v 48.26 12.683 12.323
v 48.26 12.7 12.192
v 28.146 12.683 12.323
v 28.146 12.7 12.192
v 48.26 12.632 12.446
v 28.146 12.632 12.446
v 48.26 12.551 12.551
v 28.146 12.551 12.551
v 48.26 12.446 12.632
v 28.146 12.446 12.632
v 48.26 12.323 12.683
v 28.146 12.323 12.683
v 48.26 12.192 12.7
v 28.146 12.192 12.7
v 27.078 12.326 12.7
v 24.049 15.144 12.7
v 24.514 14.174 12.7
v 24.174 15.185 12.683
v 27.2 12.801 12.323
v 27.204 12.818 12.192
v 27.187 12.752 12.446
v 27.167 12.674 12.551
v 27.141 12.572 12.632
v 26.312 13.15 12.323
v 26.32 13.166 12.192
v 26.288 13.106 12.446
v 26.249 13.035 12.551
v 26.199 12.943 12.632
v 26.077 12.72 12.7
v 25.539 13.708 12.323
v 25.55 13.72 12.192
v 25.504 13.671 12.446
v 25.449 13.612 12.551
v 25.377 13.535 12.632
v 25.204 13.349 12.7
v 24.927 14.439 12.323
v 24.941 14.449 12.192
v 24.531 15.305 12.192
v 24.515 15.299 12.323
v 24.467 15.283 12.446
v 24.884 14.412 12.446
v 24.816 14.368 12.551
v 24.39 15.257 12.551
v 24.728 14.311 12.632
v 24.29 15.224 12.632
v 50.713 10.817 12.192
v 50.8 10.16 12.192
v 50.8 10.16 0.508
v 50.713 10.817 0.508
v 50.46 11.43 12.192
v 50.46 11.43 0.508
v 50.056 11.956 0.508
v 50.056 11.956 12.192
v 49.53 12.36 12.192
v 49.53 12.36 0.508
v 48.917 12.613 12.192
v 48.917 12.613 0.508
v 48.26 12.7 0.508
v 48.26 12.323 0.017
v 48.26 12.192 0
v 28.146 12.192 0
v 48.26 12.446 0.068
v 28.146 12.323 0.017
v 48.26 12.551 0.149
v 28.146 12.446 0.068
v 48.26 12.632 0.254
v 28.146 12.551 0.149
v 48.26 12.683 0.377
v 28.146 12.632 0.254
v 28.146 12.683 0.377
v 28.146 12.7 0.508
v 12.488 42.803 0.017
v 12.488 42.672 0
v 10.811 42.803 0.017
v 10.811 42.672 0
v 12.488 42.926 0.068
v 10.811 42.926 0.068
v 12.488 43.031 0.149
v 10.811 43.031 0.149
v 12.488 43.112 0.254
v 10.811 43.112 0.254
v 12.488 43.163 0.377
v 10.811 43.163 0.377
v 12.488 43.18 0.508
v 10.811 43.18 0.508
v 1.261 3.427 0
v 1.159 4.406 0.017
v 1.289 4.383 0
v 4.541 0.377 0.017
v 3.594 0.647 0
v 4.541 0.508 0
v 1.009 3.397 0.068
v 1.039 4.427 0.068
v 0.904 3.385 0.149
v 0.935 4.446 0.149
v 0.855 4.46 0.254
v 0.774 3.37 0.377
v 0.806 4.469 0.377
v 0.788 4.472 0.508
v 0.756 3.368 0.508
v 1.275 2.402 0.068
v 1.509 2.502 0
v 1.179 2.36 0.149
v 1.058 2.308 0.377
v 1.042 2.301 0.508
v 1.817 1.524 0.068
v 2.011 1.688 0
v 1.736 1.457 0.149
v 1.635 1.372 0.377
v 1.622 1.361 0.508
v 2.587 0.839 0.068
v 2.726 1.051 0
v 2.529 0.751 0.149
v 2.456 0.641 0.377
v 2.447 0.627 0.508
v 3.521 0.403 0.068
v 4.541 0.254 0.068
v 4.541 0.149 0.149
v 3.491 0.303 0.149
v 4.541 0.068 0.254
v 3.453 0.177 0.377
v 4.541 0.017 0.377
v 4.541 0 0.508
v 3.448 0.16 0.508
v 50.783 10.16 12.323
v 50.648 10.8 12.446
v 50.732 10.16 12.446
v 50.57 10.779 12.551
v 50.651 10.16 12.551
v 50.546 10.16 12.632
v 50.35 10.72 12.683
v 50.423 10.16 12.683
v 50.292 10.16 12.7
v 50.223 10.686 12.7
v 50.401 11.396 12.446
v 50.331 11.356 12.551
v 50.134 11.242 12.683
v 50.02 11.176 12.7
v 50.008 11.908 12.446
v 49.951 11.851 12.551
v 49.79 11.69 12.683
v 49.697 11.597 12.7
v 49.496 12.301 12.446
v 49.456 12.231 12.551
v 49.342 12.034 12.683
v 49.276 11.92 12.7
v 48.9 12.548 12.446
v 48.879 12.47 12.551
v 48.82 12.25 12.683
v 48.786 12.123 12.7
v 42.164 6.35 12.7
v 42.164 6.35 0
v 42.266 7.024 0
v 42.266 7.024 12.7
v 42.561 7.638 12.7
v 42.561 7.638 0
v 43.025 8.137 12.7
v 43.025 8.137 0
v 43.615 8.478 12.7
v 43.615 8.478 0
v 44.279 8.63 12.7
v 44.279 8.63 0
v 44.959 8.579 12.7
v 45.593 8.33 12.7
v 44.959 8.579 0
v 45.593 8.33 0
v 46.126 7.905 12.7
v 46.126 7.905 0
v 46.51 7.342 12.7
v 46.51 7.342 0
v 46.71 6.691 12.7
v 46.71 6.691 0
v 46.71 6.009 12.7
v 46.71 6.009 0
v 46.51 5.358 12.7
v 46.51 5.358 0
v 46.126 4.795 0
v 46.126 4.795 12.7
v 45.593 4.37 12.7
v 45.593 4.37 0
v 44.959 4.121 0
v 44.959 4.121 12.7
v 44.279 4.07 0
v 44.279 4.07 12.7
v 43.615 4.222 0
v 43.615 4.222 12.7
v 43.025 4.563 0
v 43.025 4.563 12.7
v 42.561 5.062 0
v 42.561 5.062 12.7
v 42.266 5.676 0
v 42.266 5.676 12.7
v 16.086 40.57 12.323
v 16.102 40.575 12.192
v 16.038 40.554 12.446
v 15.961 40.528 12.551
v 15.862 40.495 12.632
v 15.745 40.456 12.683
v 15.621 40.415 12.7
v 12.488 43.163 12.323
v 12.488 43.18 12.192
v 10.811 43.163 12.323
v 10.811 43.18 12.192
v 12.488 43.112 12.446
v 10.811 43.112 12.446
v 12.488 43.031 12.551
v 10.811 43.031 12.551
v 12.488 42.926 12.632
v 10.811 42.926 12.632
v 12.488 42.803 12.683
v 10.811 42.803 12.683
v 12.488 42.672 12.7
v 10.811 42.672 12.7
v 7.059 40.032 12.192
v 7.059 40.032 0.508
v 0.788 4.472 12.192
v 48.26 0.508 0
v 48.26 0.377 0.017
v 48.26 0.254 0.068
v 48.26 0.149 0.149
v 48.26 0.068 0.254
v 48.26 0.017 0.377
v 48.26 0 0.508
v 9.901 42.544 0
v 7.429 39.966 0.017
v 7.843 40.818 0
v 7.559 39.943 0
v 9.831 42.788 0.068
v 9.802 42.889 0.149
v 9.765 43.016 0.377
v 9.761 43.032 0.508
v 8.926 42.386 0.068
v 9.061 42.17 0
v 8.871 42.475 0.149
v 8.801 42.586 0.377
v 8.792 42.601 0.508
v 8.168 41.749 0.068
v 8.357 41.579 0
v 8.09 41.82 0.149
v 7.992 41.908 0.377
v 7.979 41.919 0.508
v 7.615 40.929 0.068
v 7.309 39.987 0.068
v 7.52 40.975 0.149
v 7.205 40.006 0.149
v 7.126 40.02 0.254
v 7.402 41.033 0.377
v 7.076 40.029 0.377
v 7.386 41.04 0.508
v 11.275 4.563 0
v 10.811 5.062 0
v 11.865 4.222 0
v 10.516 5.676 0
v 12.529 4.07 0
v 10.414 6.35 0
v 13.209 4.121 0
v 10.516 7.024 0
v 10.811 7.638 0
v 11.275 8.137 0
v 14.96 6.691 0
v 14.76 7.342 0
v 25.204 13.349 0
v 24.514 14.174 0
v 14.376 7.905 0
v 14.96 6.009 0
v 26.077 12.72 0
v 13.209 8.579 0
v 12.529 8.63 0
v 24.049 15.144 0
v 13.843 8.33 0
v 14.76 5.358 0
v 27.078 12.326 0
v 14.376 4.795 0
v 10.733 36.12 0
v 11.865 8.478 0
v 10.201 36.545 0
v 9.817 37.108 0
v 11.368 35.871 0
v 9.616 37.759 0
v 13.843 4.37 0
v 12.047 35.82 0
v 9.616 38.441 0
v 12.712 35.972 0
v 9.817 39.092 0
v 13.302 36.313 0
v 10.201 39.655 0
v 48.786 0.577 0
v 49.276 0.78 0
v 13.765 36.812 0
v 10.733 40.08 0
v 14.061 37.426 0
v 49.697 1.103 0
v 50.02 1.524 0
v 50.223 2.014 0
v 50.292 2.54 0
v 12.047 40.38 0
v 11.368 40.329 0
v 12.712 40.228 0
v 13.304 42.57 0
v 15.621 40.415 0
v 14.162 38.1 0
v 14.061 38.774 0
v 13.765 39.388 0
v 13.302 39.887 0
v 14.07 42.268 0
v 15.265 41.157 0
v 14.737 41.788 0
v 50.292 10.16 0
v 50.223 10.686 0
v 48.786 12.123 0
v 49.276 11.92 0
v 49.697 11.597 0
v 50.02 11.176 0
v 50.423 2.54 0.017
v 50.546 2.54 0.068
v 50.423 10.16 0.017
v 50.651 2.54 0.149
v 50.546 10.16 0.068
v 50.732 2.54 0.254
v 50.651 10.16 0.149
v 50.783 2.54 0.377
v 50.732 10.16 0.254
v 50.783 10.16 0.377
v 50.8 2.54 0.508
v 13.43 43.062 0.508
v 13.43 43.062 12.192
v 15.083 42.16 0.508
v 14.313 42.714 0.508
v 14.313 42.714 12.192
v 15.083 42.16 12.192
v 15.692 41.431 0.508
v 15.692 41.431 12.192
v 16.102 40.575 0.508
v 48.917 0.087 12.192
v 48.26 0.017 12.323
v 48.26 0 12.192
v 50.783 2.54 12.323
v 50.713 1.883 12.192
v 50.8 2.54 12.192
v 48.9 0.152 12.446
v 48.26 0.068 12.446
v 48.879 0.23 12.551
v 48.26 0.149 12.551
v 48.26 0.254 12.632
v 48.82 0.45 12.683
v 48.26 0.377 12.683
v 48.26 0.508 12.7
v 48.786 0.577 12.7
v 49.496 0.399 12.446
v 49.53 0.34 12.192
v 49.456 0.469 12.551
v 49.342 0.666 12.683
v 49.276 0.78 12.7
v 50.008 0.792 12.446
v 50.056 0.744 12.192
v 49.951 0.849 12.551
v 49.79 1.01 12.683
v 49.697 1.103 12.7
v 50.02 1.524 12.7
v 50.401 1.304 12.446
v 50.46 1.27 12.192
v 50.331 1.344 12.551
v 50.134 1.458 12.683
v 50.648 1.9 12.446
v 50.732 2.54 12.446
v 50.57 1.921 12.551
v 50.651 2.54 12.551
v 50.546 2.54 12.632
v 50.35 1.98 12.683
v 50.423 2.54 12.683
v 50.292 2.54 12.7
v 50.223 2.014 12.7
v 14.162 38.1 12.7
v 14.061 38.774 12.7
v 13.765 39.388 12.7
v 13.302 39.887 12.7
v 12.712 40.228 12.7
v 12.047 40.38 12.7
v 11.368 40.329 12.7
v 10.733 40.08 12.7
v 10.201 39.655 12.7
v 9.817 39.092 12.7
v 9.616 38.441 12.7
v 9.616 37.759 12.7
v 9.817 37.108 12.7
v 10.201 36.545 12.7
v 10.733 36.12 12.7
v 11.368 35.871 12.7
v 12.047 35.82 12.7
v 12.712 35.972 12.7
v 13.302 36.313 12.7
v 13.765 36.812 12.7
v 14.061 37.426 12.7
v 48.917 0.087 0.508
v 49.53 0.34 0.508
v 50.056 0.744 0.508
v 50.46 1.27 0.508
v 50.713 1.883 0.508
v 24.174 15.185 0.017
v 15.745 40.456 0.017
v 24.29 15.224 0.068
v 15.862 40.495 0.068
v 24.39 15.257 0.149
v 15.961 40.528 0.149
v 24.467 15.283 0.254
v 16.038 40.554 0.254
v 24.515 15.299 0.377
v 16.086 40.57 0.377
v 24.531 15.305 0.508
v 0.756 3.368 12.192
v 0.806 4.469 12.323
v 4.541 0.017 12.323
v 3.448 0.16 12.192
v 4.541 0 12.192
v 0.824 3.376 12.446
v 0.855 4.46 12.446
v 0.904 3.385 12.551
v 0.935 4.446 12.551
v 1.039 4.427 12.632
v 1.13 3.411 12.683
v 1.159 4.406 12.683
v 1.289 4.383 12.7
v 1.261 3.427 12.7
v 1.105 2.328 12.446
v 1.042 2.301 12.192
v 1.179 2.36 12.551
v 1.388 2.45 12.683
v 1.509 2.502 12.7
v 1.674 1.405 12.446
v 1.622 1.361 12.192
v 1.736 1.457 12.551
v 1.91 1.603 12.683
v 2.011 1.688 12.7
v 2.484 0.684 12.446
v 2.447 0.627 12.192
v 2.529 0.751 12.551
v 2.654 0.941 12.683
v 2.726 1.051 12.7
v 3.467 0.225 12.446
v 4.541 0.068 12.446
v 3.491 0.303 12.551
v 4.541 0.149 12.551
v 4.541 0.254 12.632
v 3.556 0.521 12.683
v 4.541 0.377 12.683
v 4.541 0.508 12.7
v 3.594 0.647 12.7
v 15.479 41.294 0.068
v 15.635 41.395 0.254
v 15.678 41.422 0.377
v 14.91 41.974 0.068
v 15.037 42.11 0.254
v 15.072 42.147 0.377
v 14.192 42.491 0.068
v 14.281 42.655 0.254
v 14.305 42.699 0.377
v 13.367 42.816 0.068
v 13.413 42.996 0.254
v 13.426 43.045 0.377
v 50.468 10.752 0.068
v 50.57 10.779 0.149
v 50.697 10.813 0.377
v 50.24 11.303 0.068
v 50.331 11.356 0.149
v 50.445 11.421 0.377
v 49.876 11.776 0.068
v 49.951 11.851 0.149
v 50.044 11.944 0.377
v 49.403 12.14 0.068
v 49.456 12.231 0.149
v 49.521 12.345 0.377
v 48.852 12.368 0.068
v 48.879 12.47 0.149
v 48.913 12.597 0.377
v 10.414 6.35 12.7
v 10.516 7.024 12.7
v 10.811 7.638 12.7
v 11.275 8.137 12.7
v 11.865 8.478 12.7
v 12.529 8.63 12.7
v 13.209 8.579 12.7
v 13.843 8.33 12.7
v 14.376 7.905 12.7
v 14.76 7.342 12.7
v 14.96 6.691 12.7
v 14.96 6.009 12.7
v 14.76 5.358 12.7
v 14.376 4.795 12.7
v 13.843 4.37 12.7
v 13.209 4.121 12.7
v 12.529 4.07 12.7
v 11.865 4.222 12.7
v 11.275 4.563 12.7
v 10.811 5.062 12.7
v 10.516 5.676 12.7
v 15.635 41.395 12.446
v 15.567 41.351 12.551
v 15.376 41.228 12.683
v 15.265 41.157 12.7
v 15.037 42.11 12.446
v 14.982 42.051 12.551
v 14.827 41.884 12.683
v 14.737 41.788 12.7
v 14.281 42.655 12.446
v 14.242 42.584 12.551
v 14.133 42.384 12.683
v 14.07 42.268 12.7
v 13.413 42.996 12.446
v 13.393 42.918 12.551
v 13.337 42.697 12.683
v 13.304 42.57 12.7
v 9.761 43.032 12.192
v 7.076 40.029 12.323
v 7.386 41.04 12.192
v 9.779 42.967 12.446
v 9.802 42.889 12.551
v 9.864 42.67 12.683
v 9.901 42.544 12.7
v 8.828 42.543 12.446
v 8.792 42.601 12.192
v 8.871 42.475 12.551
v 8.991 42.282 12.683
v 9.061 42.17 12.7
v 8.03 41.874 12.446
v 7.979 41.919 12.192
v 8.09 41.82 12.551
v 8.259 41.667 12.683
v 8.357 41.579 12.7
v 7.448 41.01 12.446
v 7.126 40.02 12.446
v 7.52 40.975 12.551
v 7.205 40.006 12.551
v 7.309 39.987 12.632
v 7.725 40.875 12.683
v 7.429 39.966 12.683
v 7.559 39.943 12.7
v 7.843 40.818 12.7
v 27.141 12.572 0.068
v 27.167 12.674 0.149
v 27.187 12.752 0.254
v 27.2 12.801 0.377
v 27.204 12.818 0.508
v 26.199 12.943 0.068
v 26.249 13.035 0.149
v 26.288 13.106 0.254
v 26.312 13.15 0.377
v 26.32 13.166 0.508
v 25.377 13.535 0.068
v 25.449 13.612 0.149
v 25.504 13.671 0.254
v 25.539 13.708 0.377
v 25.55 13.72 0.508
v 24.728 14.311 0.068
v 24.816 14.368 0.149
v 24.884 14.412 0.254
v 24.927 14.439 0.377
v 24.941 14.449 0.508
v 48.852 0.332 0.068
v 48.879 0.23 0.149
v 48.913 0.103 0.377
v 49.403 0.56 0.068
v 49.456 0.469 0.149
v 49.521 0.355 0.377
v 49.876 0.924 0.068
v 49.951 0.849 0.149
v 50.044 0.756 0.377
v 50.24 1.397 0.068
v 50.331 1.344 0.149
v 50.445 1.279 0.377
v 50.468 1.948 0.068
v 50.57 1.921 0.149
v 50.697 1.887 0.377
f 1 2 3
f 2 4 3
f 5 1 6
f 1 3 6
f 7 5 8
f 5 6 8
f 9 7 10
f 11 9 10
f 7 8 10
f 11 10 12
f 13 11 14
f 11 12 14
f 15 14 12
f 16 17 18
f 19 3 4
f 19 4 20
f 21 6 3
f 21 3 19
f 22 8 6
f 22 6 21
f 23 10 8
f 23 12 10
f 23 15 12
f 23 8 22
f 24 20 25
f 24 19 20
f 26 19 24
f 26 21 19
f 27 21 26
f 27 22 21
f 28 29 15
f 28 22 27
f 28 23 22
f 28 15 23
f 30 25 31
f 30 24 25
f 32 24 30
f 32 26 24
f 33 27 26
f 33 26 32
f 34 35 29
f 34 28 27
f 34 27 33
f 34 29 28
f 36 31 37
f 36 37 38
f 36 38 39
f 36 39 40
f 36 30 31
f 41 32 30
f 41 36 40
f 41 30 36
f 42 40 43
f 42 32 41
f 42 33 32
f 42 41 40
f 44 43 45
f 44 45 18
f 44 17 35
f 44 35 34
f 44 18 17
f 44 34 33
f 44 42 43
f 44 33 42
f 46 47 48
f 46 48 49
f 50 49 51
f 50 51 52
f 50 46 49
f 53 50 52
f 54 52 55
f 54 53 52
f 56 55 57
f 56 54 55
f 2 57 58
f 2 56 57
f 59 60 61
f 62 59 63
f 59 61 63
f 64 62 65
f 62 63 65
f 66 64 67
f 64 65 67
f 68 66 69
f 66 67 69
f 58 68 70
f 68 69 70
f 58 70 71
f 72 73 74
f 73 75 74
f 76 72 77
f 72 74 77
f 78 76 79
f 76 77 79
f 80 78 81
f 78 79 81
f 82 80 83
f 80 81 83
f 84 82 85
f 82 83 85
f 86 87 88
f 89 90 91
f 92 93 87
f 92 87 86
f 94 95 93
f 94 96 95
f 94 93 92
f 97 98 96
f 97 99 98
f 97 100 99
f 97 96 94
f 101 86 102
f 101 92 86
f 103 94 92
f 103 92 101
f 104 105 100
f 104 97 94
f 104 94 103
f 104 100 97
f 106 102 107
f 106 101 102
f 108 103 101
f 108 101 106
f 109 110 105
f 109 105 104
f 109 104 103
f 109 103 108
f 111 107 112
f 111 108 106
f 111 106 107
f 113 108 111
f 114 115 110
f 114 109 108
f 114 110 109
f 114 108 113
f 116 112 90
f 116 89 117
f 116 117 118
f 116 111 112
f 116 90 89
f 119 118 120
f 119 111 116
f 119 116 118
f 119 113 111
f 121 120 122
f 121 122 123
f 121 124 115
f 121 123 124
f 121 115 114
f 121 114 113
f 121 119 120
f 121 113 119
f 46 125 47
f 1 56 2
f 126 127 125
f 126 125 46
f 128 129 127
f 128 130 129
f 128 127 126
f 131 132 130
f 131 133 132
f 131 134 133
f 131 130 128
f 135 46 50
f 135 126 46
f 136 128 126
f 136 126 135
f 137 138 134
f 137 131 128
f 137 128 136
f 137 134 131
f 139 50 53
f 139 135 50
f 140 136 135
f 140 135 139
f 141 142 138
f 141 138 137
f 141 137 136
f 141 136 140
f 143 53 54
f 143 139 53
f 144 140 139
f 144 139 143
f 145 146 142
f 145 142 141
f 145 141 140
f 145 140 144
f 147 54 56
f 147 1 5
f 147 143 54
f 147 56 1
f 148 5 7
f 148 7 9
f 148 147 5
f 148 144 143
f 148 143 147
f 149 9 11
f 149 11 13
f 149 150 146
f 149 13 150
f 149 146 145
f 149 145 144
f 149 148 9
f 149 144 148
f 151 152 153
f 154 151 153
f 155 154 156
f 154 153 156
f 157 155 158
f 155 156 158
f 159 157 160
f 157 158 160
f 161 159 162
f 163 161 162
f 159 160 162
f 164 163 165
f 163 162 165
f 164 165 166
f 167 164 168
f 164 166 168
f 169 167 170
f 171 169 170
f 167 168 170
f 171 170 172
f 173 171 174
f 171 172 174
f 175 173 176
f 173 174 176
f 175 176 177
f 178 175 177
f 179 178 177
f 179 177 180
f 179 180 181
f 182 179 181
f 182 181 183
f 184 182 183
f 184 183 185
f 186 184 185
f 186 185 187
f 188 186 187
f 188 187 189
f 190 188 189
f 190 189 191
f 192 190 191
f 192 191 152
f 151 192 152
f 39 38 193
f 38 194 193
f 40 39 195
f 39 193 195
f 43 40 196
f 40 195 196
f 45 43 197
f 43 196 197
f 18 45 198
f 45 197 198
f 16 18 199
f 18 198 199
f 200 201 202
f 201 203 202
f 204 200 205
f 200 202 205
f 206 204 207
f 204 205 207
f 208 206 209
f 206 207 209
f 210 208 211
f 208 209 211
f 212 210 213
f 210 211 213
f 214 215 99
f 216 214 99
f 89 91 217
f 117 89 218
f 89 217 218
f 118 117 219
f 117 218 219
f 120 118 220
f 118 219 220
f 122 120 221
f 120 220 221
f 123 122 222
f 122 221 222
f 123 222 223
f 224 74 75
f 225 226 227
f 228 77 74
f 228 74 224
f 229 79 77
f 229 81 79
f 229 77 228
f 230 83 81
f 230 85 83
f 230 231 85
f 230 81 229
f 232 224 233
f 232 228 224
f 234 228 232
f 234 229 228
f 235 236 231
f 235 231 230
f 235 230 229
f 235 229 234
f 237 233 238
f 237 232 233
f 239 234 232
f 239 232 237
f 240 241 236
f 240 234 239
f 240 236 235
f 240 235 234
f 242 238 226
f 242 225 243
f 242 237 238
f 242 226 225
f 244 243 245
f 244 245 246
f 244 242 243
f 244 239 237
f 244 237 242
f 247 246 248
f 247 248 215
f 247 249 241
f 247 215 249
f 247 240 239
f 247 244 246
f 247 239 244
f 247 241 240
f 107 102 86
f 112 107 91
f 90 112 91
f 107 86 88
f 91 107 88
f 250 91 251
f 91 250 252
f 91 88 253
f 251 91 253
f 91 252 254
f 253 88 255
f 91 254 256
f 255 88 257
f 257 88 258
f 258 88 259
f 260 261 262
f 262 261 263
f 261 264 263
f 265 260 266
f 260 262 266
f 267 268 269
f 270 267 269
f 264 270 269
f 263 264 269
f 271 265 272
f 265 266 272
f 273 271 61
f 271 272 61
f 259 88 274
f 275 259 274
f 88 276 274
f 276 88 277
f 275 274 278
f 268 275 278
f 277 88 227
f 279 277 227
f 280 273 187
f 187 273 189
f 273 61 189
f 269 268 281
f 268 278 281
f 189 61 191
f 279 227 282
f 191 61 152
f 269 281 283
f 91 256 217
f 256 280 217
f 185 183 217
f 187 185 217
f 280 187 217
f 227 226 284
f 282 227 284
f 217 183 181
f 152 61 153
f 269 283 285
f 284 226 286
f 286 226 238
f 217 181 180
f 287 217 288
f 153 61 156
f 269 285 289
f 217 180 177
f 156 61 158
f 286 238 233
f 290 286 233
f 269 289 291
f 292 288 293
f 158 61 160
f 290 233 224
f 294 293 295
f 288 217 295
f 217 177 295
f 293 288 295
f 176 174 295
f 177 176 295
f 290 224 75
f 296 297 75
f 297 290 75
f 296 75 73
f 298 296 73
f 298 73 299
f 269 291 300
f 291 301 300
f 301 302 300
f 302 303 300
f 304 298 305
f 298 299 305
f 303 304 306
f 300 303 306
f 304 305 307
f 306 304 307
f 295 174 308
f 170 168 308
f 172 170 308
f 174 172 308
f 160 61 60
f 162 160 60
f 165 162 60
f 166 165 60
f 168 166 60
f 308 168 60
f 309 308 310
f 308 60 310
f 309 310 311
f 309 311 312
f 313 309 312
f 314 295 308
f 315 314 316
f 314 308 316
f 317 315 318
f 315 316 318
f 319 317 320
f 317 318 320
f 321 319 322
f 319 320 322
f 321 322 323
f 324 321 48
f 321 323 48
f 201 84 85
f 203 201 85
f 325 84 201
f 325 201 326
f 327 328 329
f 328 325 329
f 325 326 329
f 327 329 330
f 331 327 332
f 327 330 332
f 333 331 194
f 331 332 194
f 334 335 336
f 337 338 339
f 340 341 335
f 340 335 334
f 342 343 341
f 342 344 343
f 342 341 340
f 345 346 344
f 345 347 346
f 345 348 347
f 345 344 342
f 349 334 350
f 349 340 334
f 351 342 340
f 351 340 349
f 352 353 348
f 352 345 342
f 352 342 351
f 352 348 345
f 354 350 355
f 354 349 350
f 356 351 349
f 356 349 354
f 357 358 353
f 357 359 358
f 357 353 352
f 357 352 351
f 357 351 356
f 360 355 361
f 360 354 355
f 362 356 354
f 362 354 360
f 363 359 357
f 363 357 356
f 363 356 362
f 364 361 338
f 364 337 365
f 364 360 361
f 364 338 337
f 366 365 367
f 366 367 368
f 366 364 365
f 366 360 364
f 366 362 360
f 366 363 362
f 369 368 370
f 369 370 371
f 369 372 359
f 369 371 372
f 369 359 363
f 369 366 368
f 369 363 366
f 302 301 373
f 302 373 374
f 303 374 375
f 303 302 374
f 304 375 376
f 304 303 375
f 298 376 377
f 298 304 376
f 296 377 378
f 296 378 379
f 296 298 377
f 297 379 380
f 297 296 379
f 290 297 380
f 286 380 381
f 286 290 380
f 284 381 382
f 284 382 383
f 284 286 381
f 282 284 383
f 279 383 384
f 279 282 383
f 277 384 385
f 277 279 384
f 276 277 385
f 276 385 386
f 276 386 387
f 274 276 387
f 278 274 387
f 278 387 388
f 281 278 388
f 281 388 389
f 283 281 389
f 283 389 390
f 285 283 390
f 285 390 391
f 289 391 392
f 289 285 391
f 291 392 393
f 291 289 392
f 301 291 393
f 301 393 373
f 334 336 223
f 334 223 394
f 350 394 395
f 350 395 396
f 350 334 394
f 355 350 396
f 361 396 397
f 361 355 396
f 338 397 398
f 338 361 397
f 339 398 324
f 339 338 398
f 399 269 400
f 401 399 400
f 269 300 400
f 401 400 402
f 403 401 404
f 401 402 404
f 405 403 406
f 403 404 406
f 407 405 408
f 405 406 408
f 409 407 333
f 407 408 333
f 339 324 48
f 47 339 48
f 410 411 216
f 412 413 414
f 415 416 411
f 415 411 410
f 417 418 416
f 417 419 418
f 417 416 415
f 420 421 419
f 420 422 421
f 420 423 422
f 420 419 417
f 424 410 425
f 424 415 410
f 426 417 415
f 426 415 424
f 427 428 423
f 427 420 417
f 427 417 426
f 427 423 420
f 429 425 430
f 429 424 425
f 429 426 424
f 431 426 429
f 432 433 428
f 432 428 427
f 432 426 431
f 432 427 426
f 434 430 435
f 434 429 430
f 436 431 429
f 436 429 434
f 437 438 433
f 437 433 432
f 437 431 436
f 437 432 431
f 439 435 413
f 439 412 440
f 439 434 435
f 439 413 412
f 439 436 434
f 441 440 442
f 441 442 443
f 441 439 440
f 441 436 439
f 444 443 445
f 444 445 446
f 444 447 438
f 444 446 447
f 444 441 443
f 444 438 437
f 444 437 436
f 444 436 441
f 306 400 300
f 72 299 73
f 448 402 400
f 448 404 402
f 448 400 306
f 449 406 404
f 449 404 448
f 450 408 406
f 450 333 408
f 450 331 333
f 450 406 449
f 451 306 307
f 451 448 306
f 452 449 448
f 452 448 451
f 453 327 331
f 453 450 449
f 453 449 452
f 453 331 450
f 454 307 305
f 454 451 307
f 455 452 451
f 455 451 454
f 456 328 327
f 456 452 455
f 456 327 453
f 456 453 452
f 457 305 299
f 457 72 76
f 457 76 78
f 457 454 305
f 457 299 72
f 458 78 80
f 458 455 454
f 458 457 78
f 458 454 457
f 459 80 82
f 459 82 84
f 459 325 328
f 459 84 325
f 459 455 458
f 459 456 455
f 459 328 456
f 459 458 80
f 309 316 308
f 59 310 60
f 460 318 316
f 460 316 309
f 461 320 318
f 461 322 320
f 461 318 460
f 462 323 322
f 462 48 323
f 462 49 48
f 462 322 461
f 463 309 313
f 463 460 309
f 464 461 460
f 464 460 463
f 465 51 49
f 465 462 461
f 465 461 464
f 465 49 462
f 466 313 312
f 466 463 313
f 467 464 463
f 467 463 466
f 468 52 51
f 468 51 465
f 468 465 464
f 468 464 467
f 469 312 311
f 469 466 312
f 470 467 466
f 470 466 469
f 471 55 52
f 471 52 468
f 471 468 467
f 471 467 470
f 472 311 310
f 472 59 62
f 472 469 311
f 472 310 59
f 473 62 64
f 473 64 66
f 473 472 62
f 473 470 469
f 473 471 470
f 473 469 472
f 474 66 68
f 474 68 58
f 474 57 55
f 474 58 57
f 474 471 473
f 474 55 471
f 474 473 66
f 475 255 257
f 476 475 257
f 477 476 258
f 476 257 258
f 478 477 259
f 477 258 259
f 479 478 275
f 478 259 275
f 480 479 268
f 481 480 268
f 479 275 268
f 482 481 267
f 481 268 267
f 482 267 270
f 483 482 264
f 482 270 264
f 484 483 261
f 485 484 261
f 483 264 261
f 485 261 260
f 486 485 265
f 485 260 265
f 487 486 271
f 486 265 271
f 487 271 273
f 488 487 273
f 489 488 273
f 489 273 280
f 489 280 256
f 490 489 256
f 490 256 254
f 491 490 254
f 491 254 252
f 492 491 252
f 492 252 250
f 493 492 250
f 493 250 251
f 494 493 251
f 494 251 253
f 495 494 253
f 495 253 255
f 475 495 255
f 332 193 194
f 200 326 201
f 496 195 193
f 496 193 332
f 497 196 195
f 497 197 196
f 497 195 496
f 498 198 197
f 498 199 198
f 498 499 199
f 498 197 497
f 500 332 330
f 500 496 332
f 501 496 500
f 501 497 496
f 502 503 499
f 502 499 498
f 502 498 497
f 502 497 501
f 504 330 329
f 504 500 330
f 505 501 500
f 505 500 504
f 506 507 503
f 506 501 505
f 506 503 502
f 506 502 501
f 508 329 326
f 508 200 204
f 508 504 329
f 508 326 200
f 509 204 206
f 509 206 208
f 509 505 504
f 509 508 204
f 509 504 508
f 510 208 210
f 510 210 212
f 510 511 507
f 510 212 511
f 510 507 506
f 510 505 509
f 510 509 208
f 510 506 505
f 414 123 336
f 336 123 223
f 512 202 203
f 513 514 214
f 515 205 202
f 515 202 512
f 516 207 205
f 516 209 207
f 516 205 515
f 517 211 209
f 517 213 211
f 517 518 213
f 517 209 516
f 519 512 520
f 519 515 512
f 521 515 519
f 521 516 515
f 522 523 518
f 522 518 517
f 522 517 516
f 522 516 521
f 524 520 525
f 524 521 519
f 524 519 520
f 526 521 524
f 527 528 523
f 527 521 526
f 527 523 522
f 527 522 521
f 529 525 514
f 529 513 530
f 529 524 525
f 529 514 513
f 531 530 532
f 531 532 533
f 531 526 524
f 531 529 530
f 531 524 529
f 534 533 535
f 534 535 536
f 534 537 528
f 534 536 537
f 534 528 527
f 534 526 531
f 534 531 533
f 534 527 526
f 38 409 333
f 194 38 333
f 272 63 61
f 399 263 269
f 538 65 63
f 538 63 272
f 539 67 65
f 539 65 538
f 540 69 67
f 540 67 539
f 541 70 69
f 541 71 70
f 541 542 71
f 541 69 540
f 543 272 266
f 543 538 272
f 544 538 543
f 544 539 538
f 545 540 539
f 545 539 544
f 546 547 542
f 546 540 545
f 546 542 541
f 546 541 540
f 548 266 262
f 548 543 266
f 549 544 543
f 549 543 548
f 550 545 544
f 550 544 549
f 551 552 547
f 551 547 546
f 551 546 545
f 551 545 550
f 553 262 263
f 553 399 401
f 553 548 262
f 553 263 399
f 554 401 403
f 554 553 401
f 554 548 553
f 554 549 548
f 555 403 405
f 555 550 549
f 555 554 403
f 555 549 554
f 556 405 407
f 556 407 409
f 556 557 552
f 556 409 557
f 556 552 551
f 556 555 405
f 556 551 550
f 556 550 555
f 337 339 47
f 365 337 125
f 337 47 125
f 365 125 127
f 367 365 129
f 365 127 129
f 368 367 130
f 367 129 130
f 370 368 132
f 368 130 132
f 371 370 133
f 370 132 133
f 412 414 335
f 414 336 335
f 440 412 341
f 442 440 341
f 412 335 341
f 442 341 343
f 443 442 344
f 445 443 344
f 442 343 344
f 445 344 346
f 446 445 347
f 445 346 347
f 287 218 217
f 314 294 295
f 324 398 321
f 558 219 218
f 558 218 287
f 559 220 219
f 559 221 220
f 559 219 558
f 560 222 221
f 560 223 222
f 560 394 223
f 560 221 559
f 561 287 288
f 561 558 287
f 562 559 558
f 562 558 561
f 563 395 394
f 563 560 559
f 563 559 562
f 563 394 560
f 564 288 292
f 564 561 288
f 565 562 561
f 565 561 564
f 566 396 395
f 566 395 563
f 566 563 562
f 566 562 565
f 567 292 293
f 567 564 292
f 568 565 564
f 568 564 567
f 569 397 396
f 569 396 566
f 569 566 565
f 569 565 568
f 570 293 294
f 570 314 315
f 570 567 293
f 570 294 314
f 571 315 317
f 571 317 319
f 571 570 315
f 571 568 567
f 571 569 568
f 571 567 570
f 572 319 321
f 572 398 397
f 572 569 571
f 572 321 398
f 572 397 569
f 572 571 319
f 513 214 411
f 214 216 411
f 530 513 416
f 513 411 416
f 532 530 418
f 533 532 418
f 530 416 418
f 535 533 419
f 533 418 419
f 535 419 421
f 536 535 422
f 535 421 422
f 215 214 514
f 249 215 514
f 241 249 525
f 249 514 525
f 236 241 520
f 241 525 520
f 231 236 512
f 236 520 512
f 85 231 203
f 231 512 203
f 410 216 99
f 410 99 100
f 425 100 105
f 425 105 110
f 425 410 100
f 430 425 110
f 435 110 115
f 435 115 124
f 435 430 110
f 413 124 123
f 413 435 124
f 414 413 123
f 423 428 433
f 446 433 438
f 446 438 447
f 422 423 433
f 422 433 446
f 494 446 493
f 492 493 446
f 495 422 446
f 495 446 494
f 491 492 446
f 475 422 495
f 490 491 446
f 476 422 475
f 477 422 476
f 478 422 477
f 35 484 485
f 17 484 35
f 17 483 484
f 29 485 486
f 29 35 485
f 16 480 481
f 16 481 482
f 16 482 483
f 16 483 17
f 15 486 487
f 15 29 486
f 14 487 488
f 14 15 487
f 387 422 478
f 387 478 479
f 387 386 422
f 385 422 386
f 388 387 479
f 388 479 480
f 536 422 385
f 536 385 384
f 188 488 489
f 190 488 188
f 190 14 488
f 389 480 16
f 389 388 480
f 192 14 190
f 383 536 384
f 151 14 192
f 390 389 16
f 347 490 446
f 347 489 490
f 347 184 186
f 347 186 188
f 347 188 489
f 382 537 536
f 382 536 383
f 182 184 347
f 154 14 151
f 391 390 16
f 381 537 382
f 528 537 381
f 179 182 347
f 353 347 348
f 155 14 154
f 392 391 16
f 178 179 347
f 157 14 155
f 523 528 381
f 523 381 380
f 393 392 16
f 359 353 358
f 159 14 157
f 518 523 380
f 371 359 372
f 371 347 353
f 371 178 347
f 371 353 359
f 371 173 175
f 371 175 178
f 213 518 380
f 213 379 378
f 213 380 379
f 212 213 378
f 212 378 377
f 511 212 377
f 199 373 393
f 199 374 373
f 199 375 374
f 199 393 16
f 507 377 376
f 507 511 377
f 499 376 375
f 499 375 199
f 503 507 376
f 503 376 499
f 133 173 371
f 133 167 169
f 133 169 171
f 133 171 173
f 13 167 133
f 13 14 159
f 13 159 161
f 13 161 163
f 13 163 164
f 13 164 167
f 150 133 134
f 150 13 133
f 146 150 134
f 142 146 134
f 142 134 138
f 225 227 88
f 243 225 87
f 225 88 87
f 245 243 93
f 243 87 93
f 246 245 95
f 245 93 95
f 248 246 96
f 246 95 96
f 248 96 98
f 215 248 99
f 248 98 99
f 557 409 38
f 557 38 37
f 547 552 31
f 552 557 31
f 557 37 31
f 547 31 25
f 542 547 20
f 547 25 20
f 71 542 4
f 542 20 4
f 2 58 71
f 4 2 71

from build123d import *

# Parameters (mm, degrees)
SKETCH1_R           = 2.286
BOSS_EXTRUDE1_DEPTH = 12.7
FILLET2_R           = 3.81
FILLET3_R           = 2.54
SKETCH6_R           = 2.286
CUT_EXTRUDE4_DEPTH  = 68.870777217
FILLET4_R           = 0.508


with BuildPart() as part:
    # Sketch1 → Boss-Extrude1 (new body)
    with BuildSketch(Plane.XY):
        Polygon((7.613799027, 43.18), (0, 0), (50.8, 0), (50.8, 12.7), (25.4, 12.7), (15.233799027, 43.18), align=None)
        with Locations((11.876425153, 38.1)):
            Circle(SKETCH1_R, mode=Mode.SUBTRACT)
    extrude(amount=BOSS_EXTRUDE1_DEPTH)

    # Fillet2
    fillet2_edges = [part.edges().sort_by_distance(p)[0] for p in [
        (0, 0, 6.35),
        (7.613799027, 43.18, 6.35),
        (15.233799027, 43.18, 6.35),
        (25.4, 12.7, 6.35),
    ]]
    fillet(fillet2_edges, radius=FILLET2_R)

    # Fillet3
    fillet3_edges = [part.edges().sort_by_distance(p)[0] for p in [
        (50.8, 12.7, 6.35),
        (50.8, 0, 6.35),
    ]]
    fillet(fillet3_edges, radius=FILLET3_R)

    # Sketch6 → Cut-Extrude4 (cut, through all)
    with BuildSketch(Plane(origin=(0, 0, 0), x_dir=(-1, 0, 0), z_dir=(0, 0, -1))):
        with Locations((-44.45, 6.35)):
            Circle(SKETCH6_R)
        with Locations((-12.7, 6.35)):
            Circle(SKETCH6_R)
    extrude(amount=-CUT_EXTRUDE4_DEPTH, mode=Mode.SUBTRACT)

    # Fillet4
    fillet4_edges = [part.edges().sort_by_distance(p)[0] for p in [
        (11.64950248, 43.18, 0),
        (11.64950248, 43.18, 12.7),
        (26.400290594, 0, 0),
        (3.923557366, 22.251599557, 0),
        (20.316899513, 27.94, 0),
        (8.361747829, 42.288629328, 0),
        (1.62195186, 1.360979207, 0),
        (14.715699565, 42.46103665, 0),
        (20.316899513, 27.94, 12.7),
        (26.400290594, 0, 12.7),
        (3.923557366, 22.251599557, 12.7),
        (8.361747829, 42.288629328, 12.7),
        (1.62195186, 1.360979207, 12.7),
        (14.715699565, 42.46103665, 12.7),
        (25.918099462, 13.41896335, 0),
        (25.918099462, 13.41896335, 12.7),
        (50.8, 6.35, 0),
        (50.8, 6.35, 12.7),
        (38.202781345, 12.7, 0),
        (50.056051224, 11.956051224, 0),
        (50.056051224, 0.743948776, 0),
        (38.202781345, 12.7, 12.7),
        (50.056051224, 11.956051224, 12.7),
        (50.056051224, 0.743948776, 12.7),
    ]]
    fillet(fillet4_edges, radius=FILLET4_R)


solid = part.part
